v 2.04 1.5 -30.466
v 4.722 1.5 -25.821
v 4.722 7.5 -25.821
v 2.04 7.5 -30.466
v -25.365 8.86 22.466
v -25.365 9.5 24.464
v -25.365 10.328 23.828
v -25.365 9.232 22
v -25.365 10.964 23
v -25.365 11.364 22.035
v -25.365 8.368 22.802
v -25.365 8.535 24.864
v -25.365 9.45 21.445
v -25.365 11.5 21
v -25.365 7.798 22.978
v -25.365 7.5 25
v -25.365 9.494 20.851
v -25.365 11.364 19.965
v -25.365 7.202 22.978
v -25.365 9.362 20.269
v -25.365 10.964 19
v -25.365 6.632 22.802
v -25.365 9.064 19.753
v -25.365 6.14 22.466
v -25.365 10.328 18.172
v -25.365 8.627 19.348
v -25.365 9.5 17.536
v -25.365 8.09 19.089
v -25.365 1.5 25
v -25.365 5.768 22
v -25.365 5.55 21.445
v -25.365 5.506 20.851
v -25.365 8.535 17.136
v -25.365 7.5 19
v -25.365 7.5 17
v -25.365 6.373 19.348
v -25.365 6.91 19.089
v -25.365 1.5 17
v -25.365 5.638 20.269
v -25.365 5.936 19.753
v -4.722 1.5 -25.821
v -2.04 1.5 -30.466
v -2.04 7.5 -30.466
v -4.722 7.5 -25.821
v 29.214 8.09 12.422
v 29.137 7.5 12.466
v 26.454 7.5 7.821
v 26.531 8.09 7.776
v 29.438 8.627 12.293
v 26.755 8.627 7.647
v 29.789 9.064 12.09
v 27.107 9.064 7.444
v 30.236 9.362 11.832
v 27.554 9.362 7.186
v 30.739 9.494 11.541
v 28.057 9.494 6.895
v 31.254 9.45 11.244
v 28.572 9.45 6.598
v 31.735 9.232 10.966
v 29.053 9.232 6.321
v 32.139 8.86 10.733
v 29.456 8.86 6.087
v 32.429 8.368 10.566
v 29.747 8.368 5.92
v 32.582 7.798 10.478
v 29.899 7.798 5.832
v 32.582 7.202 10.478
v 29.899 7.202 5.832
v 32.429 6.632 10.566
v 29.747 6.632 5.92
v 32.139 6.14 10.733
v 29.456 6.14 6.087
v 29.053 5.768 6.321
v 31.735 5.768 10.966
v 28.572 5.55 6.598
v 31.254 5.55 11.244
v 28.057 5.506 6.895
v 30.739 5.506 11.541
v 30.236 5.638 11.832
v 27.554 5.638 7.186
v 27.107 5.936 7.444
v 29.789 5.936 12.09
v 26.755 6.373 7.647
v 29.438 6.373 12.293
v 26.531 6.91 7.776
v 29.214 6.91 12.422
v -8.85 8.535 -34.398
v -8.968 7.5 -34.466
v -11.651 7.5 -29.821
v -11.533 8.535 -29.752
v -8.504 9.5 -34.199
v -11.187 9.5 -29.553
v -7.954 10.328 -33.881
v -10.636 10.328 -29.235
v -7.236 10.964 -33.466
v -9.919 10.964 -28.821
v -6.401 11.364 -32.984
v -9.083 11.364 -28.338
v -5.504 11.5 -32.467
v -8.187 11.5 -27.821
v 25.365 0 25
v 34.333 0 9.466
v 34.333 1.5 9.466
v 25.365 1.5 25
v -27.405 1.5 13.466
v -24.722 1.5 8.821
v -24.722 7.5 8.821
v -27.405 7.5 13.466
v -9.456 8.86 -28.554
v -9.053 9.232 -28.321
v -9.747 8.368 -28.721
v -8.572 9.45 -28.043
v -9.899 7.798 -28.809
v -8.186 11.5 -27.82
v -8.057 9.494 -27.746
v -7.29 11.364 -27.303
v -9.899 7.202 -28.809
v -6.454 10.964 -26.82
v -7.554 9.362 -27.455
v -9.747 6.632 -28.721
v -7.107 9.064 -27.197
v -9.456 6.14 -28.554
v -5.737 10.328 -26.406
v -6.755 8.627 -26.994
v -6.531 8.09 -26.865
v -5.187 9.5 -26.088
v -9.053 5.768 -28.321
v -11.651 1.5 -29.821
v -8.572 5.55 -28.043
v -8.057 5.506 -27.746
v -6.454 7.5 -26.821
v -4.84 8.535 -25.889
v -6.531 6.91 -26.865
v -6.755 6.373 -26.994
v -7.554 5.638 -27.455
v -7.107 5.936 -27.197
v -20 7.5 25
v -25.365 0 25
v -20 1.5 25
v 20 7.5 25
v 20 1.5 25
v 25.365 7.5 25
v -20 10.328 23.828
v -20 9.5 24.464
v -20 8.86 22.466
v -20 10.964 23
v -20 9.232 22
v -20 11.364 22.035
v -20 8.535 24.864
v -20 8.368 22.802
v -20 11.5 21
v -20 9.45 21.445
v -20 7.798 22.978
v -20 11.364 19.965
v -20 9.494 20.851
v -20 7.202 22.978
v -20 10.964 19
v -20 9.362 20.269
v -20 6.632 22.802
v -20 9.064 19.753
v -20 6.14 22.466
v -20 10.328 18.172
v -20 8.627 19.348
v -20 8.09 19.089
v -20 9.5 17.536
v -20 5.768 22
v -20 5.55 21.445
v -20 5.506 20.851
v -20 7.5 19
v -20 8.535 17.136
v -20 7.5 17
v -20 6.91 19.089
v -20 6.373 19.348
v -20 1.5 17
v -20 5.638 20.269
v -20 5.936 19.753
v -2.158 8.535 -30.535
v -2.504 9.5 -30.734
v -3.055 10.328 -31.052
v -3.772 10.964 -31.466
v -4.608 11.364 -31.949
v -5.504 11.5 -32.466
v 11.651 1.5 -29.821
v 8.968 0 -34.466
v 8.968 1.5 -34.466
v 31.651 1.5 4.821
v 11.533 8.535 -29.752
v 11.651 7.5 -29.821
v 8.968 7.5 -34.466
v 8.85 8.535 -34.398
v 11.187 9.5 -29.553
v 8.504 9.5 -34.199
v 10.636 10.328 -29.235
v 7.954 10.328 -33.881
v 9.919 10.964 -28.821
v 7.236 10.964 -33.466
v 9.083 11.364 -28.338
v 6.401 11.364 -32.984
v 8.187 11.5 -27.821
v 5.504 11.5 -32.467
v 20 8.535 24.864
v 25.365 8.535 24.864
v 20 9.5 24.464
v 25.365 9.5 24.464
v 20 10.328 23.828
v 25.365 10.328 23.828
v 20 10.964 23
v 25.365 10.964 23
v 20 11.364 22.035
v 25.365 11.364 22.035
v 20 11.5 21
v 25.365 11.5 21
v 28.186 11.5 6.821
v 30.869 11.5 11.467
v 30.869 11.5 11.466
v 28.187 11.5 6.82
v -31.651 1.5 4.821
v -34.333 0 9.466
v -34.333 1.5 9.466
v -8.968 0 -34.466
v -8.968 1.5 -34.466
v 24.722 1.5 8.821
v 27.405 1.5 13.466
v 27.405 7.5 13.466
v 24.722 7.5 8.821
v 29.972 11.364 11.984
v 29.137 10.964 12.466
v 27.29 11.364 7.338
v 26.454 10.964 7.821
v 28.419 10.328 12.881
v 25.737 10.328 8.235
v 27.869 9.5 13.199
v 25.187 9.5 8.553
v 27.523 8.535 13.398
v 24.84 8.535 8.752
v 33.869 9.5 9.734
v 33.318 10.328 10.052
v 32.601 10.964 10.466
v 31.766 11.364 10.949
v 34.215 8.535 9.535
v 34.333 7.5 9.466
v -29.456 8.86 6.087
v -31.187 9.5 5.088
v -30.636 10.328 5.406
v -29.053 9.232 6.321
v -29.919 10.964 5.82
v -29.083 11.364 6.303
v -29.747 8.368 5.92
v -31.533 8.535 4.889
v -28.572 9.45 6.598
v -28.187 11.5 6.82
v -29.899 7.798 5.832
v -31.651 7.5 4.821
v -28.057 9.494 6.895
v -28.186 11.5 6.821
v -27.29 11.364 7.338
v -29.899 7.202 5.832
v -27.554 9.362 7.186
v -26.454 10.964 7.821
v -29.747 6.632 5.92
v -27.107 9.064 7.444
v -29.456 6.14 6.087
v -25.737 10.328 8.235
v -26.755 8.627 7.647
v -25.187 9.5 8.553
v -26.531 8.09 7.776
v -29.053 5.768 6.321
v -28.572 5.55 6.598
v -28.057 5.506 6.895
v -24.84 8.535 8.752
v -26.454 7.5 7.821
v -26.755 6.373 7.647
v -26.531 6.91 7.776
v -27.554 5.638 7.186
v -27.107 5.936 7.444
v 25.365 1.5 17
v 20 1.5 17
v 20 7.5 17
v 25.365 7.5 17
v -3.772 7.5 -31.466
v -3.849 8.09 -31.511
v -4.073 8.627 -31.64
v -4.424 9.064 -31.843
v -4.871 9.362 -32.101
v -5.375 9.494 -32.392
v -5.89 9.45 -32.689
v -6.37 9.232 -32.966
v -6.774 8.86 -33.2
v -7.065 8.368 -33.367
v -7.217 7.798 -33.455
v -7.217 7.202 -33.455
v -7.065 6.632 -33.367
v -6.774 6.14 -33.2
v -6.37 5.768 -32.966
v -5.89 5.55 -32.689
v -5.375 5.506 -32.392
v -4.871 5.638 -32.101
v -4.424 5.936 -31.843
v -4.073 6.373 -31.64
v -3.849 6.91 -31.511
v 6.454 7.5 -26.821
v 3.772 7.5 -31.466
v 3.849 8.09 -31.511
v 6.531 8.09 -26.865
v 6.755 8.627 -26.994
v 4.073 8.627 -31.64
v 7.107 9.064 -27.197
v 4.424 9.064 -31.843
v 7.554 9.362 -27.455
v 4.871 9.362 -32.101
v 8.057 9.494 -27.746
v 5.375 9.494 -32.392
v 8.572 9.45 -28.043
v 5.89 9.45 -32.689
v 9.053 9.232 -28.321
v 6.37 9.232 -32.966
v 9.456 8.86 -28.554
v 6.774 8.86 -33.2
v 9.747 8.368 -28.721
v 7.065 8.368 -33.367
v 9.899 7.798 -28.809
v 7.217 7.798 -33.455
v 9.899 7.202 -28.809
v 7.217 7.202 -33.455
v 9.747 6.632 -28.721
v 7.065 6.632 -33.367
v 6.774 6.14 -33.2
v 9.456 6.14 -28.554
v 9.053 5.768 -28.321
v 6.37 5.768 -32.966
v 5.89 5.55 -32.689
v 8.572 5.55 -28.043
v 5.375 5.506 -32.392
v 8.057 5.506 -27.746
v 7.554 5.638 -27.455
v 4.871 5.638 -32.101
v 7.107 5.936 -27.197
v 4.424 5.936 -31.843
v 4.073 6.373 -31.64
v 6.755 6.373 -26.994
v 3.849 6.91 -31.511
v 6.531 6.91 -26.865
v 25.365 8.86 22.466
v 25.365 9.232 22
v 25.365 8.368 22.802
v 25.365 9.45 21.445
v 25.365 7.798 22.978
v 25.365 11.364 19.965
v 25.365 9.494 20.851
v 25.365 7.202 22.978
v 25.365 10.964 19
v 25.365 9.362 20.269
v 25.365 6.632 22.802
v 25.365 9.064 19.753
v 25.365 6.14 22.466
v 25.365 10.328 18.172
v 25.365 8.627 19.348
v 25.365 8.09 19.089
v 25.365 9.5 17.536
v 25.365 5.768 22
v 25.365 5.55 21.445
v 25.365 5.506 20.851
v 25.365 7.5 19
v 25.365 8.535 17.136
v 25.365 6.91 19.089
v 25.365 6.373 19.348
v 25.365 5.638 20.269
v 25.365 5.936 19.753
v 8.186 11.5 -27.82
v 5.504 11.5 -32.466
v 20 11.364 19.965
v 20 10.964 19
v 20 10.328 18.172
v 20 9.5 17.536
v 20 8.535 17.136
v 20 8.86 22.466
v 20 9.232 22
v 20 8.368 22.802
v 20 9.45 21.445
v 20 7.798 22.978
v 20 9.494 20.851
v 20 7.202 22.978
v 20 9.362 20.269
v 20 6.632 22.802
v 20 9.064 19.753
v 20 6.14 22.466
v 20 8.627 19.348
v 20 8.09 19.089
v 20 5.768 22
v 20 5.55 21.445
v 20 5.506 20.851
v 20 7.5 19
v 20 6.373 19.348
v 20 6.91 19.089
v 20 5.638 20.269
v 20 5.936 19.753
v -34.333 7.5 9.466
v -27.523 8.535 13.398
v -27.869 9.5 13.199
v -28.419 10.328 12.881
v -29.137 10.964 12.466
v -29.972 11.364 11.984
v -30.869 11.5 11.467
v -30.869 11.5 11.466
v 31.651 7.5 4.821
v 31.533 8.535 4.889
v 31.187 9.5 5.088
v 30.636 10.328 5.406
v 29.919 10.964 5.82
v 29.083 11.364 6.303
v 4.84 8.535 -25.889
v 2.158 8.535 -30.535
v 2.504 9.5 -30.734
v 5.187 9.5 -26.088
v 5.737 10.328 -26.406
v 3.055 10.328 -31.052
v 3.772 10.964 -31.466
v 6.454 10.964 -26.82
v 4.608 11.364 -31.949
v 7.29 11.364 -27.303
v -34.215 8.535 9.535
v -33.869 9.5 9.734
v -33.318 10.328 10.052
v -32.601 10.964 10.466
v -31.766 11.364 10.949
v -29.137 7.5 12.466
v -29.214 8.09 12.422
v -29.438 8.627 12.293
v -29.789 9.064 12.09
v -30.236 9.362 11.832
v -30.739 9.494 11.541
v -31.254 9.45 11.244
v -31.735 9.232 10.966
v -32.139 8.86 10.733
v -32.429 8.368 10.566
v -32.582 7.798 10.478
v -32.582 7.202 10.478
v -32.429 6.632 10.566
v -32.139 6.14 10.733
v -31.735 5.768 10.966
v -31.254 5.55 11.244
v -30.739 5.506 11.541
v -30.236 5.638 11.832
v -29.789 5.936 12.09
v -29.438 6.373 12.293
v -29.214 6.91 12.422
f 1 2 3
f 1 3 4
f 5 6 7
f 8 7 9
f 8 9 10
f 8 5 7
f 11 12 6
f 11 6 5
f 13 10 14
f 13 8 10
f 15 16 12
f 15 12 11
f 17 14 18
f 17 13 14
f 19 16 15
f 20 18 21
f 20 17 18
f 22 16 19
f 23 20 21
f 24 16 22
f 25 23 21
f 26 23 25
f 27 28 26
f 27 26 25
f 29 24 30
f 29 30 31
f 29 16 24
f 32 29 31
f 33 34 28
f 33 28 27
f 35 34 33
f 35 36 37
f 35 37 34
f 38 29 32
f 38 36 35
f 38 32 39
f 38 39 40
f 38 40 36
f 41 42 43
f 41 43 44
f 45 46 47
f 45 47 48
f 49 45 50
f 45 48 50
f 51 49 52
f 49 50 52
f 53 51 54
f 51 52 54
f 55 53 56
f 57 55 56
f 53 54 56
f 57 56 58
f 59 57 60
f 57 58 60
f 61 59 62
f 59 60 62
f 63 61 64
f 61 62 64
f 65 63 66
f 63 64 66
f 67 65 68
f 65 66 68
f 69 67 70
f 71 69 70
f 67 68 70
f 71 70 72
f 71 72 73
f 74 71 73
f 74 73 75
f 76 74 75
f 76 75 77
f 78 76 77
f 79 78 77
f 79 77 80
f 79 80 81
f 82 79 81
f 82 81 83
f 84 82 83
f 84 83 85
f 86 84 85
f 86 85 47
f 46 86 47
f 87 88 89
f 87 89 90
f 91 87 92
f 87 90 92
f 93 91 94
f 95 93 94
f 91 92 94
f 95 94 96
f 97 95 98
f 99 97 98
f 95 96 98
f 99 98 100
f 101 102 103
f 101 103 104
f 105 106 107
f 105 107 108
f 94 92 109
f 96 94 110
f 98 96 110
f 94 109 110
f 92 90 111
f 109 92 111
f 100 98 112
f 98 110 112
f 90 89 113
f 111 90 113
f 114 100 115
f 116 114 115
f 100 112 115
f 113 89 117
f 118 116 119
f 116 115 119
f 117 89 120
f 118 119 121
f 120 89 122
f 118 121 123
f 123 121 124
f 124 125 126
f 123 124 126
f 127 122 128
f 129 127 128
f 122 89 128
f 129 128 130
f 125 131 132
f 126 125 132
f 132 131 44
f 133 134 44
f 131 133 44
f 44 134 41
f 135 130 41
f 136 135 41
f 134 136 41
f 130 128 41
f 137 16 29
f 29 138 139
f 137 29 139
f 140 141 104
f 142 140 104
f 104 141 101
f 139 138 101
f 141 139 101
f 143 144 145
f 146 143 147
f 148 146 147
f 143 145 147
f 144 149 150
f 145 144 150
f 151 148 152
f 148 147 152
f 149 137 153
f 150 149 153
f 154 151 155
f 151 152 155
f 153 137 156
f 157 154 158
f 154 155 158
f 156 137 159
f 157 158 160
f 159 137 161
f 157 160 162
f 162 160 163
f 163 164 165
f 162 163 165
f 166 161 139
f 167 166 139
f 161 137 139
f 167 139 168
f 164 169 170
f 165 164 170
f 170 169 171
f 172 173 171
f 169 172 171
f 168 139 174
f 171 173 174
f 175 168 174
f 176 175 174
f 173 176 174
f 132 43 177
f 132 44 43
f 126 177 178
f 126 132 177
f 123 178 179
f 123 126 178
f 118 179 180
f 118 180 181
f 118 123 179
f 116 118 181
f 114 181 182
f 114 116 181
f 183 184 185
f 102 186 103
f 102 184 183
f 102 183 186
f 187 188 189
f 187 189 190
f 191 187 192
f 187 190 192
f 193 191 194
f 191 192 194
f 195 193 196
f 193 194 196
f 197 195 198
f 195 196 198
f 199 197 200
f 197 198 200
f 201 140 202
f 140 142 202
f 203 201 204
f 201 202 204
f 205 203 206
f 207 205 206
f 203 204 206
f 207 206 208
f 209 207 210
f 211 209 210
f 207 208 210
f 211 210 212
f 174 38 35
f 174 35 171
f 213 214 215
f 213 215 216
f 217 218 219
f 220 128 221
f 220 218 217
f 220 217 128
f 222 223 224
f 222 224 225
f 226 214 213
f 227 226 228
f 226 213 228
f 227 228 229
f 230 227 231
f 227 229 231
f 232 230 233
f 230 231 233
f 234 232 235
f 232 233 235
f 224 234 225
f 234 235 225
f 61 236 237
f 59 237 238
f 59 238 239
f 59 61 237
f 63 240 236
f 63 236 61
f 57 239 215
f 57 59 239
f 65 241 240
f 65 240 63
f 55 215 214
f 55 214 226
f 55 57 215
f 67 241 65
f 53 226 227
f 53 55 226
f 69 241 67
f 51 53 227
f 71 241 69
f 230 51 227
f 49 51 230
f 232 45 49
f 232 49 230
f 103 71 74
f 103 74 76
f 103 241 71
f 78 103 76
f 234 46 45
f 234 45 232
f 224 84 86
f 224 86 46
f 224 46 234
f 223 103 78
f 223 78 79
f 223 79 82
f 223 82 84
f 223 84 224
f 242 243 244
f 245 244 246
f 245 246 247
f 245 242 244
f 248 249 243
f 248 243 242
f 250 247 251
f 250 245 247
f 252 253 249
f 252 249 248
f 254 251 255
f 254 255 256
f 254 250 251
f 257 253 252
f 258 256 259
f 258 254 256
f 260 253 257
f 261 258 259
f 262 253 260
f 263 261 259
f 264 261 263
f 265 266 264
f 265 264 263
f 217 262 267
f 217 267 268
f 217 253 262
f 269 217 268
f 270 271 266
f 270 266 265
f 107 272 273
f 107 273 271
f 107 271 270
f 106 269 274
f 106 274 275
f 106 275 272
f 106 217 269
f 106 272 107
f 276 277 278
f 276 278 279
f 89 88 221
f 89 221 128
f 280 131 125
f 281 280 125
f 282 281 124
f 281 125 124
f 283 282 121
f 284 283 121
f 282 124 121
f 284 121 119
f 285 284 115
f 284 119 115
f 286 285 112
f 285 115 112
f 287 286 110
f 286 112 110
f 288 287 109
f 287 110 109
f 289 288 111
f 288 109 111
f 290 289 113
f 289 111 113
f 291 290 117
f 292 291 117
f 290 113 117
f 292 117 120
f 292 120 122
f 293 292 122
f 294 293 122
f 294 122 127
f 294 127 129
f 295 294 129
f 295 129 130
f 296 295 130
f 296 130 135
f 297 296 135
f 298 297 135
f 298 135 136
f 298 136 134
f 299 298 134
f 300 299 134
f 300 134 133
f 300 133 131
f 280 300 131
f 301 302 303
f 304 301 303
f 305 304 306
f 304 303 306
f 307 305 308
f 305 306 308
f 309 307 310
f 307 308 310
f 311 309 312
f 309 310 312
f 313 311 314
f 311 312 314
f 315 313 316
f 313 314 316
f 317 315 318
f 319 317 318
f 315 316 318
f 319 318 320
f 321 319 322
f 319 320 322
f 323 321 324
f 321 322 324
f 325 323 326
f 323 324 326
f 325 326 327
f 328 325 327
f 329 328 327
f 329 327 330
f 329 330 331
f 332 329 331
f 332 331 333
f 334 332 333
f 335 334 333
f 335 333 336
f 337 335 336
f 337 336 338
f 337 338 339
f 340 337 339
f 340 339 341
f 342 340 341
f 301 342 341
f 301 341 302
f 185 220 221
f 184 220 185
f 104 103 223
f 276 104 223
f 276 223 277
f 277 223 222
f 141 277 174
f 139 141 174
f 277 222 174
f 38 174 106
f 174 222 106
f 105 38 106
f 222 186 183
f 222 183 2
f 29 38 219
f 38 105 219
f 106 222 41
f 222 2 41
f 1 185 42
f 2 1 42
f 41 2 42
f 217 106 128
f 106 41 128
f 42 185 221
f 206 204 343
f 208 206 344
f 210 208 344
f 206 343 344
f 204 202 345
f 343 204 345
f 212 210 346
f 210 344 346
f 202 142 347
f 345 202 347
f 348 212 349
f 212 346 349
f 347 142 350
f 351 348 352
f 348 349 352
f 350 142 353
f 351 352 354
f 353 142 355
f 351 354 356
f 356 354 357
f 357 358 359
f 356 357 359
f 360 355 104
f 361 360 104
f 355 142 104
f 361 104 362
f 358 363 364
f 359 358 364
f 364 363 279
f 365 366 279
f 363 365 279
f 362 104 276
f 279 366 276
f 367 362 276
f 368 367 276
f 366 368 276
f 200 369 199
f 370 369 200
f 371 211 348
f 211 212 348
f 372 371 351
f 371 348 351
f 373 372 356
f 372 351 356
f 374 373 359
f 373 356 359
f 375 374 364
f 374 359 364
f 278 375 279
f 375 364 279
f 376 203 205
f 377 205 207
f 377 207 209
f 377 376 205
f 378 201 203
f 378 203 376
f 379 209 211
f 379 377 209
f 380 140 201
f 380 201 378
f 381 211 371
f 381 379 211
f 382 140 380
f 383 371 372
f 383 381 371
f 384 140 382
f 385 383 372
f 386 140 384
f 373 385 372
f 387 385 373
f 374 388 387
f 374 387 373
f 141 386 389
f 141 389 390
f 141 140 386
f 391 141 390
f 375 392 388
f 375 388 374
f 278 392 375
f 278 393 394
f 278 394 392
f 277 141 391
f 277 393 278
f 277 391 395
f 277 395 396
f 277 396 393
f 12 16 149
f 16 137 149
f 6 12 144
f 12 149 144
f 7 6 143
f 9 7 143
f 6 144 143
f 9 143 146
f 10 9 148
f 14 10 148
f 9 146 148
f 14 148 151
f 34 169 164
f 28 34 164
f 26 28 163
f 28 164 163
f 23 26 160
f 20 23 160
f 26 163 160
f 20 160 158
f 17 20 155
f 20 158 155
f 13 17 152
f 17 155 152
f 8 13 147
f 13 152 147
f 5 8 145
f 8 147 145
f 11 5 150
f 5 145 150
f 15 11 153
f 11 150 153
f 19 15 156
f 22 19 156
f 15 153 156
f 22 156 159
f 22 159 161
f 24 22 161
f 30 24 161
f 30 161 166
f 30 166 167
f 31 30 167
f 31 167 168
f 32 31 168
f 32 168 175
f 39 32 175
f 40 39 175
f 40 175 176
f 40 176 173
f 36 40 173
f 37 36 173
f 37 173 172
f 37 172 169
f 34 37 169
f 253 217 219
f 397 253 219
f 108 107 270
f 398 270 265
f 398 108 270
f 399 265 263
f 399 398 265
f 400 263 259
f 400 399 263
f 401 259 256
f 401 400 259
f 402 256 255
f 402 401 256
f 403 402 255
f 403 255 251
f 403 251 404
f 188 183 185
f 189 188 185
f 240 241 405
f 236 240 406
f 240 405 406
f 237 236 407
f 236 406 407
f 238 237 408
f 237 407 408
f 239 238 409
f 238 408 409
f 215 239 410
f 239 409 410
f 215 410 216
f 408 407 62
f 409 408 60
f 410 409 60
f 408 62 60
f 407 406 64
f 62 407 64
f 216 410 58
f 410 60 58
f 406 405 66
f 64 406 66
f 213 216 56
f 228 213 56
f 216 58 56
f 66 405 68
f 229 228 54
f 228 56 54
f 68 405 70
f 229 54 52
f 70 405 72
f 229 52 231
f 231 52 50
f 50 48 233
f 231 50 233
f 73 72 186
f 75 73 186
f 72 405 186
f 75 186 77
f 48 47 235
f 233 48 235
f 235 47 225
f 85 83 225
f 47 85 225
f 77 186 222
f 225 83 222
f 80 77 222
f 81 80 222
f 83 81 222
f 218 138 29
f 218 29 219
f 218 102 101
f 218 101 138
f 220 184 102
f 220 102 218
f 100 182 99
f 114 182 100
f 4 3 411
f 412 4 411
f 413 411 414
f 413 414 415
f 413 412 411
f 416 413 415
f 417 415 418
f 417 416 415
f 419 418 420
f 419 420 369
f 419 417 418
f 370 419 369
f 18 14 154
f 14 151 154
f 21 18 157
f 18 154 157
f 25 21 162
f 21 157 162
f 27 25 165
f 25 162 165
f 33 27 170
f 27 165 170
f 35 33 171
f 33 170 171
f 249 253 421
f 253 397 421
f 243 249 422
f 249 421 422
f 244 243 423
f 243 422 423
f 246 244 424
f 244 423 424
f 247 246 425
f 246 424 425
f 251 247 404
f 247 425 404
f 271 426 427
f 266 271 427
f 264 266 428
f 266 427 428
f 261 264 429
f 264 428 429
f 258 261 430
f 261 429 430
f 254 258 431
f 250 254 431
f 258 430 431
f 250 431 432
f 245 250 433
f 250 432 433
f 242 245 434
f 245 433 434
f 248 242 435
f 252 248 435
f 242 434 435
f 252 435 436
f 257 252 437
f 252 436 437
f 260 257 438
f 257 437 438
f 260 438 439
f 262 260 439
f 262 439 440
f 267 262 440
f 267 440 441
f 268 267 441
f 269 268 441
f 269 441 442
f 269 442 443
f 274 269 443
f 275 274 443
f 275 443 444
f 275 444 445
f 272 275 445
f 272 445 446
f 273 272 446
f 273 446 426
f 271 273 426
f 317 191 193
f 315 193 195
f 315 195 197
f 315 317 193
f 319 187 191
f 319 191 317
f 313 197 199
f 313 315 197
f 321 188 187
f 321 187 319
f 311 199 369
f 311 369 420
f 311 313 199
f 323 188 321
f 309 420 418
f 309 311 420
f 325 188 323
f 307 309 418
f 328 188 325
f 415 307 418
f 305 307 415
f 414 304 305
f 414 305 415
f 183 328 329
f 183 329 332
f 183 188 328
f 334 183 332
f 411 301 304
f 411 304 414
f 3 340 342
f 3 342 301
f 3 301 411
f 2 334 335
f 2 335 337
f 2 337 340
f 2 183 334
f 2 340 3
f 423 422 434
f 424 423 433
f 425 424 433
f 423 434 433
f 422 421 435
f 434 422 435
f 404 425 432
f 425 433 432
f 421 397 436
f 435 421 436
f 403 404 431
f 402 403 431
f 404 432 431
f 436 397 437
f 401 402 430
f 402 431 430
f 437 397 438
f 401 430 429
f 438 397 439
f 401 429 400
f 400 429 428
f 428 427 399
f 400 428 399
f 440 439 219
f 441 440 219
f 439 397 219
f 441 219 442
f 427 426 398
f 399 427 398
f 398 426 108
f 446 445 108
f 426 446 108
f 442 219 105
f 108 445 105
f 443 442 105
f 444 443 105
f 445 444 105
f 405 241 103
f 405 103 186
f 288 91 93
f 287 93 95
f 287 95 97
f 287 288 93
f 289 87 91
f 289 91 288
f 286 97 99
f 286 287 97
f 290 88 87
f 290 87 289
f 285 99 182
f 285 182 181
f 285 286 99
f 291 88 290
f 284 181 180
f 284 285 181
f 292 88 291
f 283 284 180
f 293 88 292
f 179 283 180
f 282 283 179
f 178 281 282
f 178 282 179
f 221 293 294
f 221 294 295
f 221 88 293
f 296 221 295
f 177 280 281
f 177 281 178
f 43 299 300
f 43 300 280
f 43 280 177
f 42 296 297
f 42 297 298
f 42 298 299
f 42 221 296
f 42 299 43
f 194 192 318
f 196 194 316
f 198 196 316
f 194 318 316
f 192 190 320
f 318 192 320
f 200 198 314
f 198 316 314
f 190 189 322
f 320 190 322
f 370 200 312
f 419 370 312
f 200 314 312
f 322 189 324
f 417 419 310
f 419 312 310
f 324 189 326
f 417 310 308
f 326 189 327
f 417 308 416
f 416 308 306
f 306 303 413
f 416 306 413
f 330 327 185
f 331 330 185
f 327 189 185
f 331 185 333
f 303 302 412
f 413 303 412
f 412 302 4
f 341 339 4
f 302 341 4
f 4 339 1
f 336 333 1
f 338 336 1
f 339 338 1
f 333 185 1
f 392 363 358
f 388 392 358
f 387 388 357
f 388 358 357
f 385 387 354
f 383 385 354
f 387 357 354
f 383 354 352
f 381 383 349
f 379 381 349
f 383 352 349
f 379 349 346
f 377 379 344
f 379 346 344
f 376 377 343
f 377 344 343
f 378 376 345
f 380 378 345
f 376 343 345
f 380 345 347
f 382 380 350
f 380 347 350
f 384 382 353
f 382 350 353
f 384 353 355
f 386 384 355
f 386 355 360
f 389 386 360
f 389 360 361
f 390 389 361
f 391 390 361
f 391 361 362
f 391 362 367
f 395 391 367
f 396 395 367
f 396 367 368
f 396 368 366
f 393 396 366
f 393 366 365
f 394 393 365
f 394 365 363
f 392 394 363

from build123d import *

# Parameters (mm, degrees)
BOSS_EXTRUDE2_DEPTH      = 1.5
SKETCH4_W                = 5.364695745
SKETCH4_H                = 8
BOSS_EXTRUDE3_DEPTH      = 10
SKETCH5_R                = 2
CUT_EXTRUDE2_DEPTH       = 70.885624116
FILLET1_R                = 4
CIRPATTERN1_COUNT        = 3
FILLET1_OF_CIRPATTERN1_R = 4


with BuildPart() as part:
    # Sketch3 → Boss-Extrude2 (new body)
    with BuildSketch(Plane(origin=(0, 0, 0), x_dir=(1, 0, 0), z_dir=(0, 1, 0))):
        Polygon((-8.968287222, 34.466470874), (8.968287222, 34.466470874), (34.332982967, -9.466470874), (25.364695745, -25), (-25.364695745, -25), (-34.332982967, -9.466470874), align=None)
    extrude(amount=BOSS_EXTRUDE2_DEPTH)

    # Sketch4 → Boss-Extrude3 (add)
    with BuildSketch(Plane(origin=(0, 1.5, 0), x_dir=(1, 0, 0), z_dir=(0, 1, 0))):
        with Locations((-22.682347873, -21)):
            Rectangle(SKETCH4_W, SKETCH4_H)
        with Locations((22.682347873, -21)):
            Rectangle(SKETCH4_W, SKETCH4_H)
    boss_extrude3 = extrude(amount=BOSS_EXTRUDE3_DEPTH)

    # Sketch5 → Cut-Extrude2 (cut, through all)
    with BuildSketch(Plane(origin=(25.364695745, 0, 0), x_dir=(0, 0, -1), z_dir=(1, 0, 0))):
        with Locations((-21, 7.5)):
            Circle(SKETCH5_R)
    cut_extrude2 = extrude(amount=-CUT_EXTRUDE2_DEPTH, mode=Mode.SUBTRACT)

    # Fillet1
    fillet1_edges = [part.edges().sort_by_distance(p)[0] for p in [
        (-22.682347872, 11.5, 17),
        (-22.682347872, 11.5, 25),
        (22.682347872, 11.5, 17),
        (22.682347872, 11.5, 25),
    ]]
    fillet(fillet1_edges, radius=FILLET1_R - 0.0001)  # a hair under: the kernel refuses the full size

    # CirPattern1: Boss-Extrude3, Cut-Extrude2 ×3 about axis
    cirpattern1_axis = Axis((0, 0, 0), (0, 1, 0))
    add([boss_extrude3.rotate(cirpattern1_axis, i * 360 / CIRPATTERN1_COUNT) for i in range(1, CIRPATTERN1_COUNT)])
    add([cut_extrude2.rotate(cirpattern1_axis, i * 360 / CIRPATTERN1_COUNT) for i in range(1, CIRPATTERN1_COUNT)], mode=Mode.SUBTRACT)

    # Fillet1 of CirPattern1
    fillet1_of_cirpattern1_edges = [part.edges().sort_by_distance(p)[0] for p in [
        (26.063605801, 11.5, 11.143489475),
        (32.991809031, 11.5, 7.143489475),
        (3.381257928, 11.5, -28.143489475),
        (10.309461158, 11.5, -32.143489475),
        (-3.381257928, 11.5, -28.143489475),
        (-10.309461158, 11.5, -32.143489475),
        (-26.063605801, 11.5, 11.143489475),
        (-32.991809031, 11.5, 7.143489475),
    ]]
    fillet(fillet1_of_cirpattern1_edges, radius=FILLET1_OF_CIRPATTERN1_R - 0.0001)  # a hair under: the kernel refuses the full size


solid = part.part
